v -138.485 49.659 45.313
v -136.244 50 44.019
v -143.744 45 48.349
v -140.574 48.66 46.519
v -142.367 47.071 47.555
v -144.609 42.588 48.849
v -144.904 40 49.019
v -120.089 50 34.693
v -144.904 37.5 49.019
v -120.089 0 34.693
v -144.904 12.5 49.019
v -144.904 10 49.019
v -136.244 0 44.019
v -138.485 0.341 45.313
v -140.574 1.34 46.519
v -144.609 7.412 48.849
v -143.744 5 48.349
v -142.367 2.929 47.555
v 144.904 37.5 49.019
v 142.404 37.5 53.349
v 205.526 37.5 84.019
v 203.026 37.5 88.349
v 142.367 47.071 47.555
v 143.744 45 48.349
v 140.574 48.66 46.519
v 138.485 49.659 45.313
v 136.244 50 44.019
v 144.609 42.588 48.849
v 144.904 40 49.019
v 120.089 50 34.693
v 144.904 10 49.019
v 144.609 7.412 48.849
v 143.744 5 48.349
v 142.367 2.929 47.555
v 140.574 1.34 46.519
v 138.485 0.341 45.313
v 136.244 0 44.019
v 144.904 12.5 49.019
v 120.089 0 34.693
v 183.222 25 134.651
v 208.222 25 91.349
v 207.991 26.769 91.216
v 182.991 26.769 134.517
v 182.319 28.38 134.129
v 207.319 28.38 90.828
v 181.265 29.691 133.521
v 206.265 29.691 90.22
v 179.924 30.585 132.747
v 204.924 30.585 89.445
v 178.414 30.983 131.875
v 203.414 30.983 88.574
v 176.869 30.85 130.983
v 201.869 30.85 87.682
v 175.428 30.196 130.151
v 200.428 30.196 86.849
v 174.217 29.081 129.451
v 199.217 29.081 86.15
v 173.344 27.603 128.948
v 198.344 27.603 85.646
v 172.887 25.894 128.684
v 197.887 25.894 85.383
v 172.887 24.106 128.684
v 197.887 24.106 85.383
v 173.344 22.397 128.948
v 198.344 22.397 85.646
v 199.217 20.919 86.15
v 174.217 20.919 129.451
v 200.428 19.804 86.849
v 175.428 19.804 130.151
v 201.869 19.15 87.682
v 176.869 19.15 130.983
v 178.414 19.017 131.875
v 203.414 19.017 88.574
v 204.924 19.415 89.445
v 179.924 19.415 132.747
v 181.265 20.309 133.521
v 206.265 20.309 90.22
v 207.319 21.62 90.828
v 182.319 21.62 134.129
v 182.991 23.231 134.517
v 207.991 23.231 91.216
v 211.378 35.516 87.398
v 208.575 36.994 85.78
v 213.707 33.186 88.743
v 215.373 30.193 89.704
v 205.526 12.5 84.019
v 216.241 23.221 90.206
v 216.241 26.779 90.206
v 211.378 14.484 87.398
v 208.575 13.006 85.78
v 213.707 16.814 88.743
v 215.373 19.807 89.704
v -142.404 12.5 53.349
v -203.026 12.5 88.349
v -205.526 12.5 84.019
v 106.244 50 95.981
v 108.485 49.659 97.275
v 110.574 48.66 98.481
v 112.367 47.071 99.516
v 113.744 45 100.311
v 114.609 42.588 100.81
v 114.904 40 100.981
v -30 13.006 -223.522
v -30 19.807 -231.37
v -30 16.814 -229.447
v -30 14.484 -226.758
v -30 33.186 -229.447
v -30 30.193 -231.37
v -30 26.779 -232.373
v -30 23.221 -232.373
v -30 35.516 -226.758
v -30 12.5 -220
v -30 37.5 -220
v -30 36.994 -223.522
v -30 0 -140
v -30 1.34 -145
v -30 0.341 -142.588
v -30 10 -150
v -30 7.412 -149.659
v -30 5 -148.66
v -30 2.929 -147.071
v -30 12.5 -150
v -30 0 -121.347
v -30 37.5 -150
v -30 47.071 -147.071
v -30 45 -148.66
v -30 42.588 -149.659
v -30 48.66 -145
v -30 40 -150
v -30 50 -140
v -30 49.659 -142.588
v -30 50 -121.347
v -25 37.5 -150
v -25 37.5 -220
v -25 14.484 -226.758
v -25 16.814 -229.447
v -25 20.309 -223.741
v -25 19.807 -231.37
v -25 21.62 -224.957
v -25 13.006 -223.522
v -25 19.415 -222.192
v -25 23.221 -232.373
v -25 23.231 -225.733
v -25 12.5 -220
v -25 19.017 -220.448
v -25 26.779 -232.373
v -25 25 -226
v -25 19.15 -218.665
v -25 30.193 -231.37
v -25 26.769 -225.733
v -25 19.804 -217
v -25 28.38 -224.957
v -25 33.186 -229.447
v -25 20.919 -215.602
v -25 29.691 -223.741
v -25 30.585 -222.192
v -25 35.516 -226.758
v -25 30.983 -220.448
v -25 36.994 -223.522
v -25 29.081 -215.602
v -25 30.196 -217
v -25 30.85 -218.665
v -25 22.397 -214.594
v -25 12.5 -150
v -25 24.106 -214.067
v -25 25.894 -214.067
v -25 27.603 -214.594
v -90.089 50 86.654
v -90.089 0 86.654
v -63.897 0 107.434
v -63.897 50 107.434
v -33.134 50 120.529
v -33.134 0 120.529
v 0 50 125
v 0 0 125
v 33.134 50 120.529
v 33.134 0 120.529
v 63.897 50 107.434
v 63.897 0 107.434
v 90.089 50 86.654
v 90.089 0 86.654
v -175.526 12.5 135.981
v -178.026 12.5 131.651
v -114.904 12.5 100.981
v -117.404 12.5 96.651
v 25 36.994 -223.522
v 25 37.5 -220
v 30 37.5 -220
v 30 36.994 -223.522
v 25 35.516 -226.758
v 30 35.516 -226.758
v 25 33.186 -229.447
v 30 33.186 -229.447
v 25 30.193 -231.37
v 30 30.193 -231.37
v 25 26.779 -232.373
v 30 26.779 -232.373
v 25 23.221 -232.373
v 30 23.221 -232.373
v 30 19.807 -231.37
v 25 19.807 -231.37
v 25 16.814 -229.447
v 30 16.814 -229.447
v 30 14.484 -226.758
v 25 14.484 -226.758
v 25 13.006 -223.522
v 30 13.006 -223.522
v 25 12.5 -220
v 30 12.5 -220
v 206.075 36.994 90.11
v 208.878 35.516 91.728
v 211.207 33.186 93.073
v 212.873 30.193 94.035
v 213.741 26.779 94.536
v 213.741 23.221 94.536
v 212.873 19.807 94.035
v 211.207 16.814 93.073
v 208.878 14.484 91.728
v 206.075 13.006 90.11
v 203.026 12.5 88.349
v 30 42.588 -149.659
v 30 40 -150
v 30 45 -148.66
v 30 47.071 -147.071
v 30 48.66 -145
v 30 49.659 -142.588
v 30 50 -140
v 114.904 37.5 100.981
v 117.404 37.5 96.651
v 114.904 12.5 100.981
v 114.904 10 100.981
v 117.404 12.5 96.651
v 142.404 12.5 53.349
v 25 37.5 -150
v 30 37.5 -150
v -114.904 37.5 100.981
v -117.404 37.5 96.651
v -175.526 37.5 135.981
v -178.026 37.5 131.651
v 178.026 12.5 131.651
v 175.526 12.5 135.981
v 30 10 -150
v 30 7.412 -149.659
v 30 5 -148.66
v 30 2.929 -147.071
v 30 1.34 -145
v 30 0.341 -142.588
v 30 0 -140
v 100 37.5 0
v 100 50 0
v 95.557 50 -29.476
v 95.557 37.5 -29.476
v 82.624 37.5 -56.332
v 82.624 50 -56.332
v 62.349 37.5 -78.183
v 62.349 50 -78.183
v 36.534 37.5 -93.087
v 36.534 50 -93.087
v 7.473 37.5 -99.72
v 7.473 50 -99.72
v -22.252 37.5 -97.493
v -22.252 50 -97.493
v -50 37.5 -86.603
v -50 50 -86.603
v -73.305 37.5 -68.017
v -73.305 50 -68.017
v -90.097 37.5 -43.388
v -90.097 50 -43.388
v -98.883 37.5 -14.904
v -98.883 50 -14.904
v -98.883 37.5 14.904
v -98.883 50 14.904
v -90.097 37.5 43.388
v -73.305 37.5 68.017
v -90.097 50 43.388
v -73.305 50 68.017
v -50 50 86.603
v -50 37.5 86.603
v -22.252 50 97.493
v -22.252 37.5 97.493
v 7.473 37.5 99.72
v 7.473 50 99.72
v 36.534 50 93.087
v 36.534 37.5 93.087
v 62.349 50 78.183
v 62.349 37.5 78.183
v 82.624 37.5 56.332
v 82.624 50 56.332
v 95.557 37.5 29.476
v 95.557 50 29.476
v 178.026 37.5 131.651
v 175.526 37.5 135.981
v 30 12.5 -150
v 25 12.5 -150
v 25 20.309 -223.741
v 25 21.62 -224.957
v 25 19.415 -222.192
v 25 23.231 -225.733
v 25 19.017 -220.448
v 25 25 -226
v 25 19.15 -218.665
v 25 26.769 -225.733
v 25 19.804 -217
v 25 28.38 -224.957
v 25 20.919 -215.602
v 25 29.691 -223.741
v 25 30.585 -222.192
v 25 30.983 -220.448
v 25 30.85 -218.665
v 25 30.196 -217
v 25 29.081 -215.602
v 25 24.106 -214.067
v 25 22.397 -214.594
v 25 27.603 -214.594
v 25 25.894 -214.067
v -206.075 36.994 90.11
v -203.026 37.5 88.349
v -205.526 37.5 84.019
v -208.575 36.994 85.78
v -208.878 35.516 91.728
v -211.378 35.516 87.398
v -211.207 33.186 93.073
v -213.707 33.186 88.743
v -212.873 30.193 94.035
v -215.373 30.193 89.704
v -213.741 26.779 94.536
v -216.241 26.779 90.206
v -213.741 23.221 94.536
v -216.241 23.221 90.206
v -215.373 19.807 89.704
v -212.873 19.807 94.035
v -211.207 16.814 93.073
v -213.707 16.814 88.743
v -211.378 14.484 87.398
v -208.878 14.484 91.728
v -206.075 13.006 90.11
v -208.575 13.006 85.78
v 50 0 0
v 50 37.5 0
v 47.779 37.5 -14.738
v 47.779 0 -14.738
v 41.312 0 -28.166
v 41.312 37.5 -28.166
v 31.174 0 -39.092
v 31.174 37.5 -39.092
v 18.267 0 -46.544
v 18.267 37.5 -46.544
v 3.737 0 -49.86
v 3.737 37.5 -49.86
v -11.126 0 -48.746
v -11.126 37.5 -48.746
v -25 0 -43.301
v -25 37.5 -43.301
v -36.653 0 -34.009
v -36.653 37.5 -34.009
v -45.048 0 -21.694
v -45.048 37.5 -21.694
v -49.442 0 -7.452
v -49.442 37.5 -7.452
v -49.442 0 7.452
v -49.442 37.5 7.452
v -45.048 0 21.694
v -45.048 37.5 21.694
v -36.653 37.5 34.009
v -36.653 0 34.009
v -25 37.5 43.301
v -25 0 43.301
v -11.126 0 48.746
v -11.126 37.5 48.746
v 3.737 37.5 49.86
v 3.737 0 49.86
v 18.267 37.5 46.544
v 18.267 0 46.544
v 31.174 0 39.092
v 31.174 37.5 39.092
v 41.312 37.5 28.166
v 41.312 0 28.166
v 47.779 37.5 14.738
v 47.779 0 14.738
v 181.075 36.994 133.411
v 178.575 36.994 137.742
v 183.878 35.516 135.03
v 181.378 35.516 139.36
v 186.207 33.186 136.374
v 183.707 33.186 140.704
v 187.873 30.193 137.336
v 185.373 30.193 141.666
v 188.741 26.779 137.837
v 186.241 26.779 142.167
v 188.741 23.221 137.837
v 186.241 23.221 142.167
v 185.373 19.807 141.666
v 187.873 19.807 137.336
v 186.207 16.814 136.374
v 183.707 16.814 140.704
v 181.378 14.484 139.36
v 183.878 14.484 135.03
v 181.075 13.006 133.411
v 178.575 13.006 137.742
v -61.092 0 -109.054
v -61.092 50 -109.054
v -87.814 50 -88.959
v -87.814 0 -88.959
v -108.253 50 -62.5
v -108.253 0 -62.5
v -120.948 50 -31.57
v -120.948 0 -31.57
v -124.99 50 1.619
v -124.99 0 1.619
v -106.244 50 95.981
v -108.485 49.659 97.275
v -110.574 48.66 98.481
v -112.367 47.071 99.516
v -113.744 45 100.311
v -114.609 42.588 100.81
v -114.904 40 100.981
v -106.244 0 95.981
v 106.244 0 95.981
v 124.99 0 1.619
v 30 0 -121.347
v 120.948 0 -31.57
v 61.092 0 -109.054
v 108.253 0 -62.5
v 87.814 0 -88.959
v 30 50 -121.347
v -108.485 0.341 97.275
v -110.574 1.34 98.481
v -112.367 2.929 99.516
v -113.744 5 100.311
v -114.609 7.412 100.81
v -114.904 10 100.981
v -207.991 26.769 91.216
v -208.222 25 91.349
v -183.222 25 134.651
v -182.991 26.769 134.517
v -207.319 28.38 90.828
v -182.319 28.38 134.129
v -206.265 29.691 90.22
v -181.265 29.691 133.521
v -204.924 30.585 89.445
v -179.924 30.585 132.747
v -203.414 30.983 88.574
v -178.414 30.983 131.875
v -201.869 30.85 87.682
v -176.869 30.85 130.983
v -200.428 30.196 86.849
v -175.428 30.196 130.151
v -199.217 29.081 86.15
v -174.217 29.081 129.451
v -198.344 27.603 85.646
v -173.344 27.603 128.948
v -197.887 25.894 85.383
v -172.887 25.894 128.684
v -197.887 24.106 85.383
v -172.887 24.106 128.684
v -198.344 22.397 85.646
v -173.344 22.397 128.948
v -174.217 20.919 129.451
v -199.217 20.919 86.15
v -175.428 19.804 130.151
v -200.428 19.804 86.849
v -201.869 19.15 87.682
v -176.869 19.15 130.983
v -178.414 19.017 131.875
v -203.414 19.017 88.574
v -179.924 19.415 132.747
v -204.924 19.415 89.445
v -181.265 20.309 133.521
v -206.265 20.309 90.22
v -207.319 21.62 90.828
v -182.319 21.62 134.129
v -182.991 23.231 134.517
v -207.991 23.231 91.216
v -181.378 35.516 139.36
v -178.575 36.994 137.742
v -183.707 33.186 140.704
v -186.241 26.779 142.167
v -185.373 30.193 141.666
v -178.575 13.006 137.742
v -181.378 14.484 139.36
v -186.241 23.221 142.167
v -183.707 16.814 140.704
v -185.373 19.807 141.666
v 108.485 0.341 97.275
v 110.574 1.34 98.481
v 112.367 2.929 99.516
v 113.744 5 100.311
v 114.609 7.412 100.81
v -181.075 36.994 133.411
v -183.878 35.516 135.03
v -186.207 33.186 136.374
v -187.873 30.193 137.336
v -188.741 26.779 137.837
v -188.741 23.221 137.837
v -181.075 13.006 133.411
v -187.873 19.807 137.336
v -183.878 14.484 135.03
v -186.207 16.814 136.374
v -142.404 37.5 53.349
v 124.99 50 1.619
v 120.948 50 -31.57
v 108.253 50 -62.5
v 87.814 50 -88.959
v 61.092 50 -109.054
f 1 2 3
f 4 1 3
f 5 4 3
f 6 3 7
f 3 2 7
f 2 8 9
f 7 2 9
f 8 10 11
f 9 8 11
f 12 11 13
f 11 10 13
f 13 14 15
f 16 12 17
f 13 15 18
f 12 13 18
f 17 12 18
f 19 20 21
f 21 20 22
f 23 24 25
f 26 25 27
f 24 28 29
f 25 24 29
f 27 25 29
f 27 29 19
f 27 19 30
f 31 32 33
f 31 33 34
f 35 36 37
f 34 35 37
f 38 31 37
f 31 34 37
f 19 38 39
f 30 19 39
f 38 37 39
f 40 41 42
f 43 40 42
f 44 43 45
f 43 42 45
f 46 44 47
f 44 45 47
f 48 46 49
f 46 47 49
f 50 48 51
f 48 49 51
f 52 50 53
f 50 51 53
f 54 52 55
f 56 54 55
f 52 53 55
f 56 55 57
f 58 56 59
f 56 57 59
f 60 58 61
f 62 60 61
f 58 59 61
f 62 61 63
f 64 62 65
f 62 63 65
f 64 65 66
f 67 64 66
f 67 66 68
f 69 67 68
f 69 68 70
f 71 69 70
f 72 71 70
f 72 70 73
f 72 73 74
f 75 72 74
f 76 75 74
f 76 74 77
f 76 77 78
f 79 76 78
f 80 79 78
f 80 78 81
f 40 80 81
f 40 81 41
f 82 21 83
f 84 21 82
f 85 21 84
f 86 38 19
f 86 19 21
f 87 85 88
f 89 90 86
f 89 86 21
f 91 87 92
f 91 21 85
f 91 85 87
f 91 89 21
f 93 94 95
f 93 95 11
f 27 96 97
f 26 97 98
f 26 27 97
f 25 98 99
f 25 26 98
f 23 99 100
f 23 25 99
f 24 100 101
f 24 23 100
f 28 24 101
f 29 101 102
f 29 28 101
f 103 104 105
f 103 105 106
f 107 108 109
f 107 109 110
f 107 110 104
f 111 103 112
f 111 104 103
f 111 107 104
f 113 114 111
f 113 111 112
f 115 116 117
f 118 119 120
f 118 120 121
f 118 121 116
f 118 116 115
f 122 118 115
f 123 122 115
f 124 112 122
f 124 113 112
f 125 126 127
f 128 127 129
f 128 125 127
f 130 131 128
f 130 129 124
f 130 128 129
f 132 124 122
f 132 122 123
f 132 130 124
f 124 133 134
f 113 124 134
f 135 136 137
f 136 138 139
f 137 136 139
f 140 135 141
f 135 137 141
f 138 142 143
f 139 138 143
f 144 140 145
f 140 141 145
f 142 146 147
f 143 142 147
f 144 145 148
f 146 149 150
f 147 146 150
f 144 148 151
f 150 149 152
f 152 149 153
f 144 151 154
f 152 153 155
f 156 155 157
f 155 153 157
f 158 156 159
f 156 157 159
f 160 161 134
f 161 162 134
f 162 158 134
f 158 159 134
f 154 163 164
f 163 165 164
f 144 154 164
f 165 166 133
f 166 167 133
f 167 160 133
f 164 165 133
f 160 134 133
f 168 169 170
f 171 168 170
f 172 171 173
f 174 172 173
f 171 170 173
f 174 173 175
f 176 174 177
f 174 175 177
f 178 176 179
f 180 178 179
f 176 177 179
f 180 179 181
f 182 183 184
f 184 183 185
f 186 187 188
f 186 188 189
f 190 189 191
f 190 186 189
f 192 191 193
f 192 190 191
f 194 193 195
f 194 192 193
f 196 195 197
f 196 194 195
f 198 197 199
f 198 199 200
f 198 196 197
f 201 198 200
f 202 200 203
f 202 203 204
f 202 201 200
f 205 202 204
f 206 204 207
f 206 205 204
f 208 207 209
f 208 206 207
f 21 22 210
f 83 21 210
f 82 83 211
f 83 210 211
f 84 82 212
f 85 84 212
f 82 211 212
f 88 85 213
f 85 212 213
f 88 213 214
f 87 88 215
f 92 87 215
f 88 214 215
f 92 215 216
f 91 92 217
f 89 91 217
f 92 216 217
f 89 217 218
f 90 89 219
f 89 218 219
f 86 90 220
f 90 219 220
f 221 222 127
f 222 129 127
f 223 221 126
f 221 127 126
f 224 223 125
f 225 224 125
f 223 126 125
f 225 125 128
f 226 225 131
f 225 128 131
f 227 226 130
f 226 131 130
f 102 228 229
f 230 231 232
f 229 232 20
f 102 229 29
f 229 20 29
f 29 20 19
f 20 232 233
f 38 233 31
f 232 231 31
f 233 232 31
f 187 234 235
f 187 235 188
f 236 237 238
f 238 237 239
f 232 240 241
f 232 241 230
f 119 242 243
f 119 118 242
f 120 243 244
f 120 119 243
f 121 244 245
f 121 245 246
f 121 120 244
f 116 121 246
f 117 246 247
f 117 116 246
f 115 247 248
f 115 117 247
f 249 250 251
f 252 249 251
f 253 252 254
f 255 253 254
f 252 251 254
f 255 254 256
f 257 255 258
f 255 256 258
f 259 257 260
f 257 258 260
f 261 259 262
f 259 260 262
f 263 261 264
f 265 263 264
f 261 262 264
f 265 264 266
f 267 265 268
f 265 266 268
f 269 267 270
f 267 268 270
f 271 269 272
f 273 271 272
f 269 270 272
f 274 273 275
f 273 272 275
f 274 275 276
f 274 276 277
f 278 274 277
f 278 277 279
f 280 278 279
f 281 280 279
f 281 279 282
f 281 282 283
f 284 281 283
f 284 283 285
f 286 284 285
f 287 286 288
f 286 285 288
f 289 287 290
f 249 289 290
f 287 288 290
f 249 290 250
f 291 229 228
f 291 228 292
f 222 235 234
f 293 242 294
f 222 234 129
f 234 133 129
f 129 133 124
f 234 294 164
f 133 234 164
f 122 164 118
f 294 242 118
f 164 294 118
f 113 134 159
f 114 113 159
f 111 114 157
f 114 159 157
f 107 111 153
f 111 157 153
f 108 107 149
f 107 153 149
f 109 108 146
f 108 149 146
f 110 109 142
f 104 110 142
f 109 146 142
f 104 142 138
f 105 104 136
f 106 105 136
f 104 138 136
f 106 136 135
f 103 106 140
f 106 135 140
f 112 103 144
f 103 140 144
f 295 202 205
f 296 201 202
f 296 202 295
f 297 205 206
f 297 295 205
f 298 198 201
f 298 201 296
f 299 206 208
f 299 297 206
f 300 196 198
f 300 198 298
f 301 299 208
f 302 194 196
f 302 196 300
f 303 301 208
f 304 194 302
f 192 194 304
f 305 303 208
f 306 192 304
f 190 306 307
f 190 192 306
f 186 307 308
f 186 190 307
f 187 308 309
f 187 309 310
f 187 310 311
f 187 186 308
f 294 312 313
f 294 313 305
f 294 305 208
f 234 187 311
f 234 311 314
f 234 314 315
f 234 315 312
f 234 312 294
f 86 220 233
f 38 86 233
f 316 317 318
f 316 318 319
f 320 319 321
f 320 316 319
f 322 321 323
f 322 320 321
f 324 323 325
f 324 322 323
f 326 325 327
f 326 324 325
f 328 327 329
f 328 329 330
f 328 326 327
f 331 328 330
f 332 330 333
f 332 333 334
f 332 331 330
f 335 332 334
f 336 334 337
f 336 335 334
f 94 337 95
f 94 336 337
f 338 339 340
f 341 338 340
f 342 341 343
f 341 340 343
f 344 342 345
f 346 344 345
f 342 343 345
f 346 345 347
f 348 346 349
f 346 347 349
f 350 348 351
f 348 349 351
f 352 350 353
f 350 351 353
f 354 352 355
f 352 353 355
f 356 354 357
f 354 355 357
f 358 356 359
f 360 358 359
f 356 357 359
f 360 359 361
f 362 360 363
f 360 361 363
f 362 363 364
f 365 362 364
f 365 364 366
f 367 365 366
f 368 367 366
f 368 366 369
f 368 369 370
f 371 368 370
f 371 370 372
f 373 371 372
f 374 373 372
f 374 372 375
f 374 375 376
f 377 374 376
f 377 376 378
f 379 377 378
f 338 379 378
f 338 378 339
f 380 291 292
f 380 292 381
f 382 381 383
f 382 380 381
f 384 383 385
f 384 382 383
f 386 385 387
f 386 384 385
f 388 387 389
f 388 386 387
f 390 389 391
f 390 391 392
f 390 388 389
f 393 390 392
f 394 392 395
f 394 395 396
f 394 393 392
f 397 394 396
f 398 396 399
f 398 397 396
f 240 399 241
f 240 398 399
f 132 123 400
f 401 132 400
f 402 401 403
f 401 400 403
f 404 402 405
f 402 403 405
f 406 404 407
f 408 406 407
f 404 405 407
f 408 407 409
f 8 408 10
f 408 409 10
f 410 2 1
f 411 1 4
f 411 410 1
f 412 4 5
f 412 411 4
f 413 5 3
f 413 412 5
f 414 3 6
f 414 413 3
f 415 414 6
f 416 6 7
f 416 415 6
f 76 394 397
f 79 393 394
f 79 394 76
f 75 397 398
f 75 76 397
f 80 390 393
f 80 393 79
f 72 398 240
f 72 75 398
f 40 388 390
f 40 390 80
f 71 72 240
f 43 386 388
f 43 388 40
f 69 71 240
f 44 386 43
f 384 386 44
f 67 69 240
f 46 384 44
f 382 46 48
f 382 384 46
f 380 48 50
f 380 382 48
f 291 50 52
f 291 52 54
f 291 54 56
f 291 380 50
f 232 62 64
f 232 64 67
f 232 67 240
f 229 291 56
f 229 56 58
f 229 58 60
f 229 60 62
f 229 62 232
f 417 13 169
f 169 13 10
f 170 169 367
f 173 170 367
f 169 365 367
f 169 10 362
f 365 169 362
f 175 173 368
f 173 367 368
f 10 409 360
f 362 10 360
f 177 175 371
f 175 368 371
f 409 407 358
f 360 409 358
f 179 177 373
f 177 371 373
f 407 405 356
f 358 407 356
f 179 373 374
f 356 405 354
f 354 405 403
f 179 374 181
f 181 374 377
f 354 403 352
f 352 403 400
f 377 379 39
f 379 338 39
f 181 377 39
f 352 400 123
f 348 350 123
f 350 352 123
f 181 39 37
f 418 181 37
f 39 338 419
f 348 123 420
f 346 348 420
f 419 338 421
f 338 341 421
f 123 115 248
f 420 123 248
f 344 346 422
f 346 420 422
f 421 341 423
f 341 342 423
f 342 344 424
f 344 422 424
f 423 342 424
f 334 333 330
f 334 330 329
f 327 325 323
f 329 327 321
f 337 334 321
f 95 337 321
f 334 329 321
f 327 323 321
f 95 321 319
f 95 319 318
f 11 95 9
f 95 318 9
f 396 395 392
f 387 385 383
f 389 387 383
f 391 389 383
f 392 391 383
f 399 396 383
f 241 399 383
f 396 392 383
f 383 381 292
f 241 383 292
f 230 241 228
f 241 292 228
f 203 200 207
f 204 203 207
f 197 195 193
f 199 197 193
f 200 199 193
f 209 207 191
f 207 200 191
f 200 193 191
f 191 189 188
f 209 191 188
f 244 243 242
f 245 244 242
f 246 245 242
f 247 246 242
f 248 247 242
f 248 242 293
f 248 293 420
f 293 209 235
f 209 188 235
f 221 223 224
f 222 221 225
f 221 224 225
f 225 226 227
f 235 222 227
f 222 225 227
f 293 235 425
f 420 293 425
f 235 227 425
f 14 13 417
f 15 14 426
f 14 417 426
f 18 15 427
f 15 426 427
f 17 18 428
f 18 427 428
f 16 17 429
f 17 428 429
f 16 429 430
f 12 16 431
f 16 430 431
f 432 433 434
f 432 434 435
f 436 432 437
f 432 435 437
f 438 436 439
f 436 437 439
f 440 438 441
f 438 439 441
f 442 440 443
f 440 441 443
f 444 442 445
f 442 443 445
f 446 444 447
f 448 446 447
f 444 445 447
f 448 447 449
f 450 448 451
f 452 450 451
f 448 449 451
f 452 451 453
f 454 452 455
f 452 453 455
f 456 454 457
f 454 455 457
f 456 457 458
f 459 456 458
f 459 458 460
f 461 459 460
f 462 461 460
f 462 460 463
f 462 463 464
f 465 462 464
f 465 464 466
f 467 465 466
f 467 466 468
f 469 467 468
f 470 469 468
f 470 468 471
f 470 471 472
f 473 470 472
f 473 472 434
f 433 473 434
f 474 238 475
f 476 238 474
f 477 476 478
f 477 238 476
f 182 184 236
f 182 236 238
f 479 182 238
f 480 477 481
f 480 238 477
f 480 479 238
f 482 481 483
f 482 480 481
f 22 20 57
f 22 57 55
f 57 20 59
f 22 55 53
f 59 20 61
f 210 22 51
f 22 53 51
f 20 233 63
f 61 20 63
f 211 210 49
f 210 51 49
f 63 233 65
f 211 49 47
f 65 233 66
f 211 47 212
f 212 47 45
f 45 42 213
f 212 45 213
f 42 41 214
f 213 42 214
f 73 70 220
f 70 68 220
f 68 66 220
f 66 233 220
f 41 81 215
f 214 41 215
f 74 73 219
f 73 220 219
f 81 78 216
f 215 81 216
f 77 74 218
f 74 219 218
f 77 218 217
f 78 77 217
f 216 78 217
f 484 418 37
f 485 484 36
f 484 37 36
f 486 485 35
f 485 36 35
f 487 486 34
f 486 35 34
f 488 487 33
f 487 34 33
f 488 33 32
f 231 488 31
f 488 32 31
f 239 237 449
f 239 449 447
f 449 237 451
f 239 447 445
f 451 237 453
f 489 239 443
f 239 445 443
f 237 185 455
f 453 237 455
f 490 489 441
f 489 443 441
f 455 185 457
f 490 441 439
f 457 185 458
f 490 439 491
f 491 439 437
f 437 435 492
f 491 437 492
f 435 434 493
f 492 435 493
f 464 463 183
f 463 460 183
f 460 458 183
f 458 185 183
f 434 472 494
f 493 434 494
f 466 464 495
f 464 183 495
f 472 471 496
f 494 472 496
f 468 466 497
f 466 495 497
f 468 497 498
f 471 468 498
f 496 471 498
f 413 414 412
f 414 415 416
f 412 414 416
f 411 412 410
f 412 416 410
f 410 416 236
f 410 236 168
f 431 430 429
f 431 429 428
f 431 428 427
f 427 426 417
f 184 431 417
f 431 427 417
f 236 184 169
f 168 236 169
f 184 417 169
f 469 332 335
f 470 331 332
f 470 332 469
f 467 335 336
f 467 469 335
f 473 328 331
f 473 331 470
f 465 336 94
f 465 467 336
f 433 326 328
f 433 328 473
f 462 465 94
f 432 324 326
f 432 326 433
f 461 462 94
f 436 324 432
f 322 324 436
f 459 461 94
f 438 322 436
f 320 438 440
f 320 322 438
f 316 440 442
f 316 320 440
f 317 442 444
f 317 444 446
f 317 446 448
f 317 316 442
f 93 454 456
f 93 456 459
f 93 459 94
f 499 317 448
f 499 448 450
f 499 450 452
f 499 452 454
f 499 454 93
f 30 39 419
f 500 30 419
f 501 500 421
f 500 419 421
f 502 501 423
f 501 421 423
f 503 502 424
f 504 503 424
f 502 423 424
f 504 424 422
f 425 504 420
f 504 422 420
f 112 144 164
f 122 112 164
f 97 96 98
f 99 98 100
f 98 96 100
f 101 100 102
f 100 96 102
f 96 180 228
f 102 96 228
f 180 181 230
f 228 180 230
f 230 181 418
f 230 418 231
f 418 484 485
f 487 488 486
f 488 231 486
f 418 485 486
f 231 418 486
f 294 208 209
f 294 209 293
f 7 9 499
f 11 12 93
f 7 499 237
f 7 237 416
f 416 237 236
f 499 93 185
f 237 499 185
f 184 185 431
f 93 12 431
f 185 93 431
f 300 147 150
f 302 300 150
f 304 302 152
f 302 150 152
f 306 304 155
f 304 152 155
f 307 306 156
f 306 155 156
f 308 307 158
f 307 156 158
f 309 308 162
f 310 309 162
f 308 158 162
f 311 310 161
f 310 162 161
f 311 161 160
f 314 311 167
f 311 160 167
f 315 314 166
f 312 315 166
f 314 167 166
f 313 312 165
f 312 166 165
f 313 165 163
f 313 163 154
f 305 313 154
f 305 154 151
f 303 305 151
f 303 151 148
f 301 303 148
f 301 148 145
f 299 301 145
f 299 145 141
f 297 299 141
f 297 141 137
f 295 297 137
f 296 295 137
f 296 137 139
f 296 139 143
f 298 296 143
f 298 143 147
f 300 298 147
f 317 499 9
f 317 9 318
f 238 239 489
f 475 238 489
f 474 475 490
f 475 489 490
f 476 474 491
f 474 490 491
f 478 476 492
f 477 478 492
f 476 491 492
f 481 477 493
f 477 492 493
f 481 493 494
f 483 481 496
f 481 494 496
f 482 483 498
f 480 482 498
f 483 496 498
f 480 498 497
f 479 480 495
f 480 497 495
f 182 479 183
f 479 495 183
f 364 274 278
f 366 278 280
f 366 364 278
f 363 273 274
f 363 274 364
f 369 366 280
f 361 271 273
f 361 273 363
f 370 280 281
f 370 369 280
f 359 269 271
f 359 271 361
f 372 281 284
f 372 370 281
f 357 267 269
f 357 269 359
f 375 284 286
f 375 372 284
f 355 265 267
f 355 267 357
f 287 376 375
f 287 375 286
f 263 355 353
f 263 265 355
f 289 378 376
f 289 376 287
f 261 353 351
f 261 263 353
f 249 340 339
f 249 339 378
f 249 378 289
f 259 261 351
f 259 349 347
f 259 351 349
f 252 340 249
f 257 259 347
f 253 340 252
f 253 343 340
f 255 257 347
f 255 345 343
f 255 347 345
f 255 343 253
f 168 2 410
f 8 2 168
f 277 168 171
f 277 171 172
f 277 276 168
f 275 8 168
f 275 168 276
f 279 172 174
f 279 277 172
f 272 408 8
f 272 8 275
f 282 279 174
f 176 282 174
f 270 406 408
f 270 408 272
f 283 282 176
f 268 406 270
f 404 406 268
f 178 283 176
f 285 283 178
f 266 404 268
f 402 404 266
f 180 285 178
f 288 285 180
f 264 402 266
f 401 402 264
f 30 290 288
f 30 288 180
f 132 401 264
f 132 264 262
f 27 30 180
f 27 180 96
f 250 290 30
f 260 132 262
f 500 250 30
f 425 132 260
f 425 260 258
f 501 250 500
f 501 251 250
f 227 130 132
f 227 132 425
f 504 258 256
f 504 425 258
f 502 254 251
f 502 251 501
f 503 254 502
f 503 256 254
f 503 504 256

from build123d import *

# Parameters (mm, degrees)
BOSS_EXTRUDE1_DEPTH      = 50
SKETCH3_R                = 50
CUT_EXTRUDE1_DEPTH       = 50
BOSS_EXTRUDE2_START      = 25
BOSS_EXTRUDE2_DEPTH      = 5
FILLET1_R                = 10
SKETCH6_R                = 100
CUT_EXTRUDE2_DEPTH       = 12.5
BOSS_EXTRUDE3_START      = -26
SKETCH7_R                = 6
BOSS_EXTRUDE3_DEPTH      = 51
CIRPATTERN1_COUNT        = 3
CIRPATTERN1_START        = 25
CIRPATTERN1_COPY_1_DEPTH = 5
CIRPATTERN1_COPY_2_DEPTH = 5


with BuildPart() as part:
    # Sketch1 → Boss-Extrude1 (new body)
    with BuildSketch(Plane(origin=(0, 0, 0), x_dir=(1, 0, 0), z_dir=(0, 1, 0))):
        with BuildLine():
            Line((0, 150), (-30, 150))
            Line((-30, 150), (-30, 121.346610995))
            ThreePointArc((-30, 121.346610995), (-108.253175473, 62.5), (-120.089247785, -34.692543384))
            Line((-120.089247785, -34.692543384), (-144.903810568, -49.019237886))
            Line((-144.903810568, -49.019237886), (-129.903810568, -75))
            Line((-129.903810568, -75), (-114.903810568, -100.980762114))
            Line((-114.903810568, -100.980762114), (-90.089247785, -86.654067611))
            ThreePointArc((-90.089247785, -86.654067611), (0, -125), (90.089247785, -86.654067611))
            Line((90.089247785, -86.654067611), (114.903810568, -100.980762114))
            Line((114.903810568, -100.980762114), (129.903810568, -75))
            Line((129.903810568, -75), (144.903810568, -49.019237886))
            Line((144.903810568, -49.019237886), (120.089247785, -34.692543384))
            ThreePointArc((120.089247785, -34.692543384), (108.253175473, 62.5), (30, 121.346610995))
            Line((30, 121.346610995), (30, 150))
            Line((30, 150), (0, 150))
        make_face()
    extrude(amount=BOSS_EXTRUDE1_DEPTH)

    # Sketch3 → Cut-Extrude1 (cut)
    with BuildSketch(Plane(origin=(0, 50, 0), x_dir=(1, 0, 0), z_dir=(0, 1, 0))):
        Circle(SKETCH3_R)
    extrude(amount=-CUT_EXTRUDE1_DEPTH, mode=Mode.SUBTRACT)

    # Sketch4 → Boss-Extrude2 (add)
    with BuildSketch(Plane(origin=(0, 0, 0), x_dir=(0, 0, -1), z_dir=(1, 0, 0)).offset(BOSS_EXTRUDE2_START)):
        with BuildLine():
            Line((150, 37.5), (220, 37.5))
            ThreePointArc((220, 37.5), (232.5, 25), (220, 12.5))
            Line((220, 12.5), (150, 12.5))
            ThreePointArc((150, 12.5), (137.5, 25), (150, 37.5))
        make_face()
    boss_extrude2 = extrude(amount=BOSS_EXTRUDE2_DEPTH)

    # Mirror1: Boss-Extrude2 across plane
    add(boss_extrude2.mirror(Plane(origin=(0, 0, 0), x_dir=(0, 0, 1), z_dir=(1, 0, 0))))

    # Fillet1
    fillet1_edges = [part.edges().sort_by_distance(p)[0] for p in [
        (-129.903810568, 50, 75),
        (0, 0, -150),
        (129.903810568, 0, 75),
        (-129.903810568, 0, 75),
        (129.903810568, 50, 75),
        (0, 50, -150),
    ]]
    fillet(fillet1_edges, radius=FILLET1_R)

    # Sketch6 → Cut-Extrude2 (cut)
    with BuildSketch(Plane(origin=(0, 50, 0), x_dir=(1, 0, 0), z_dir=(0, 1, 0))):
        Circle(SKETCH6_R)
    extrude(amount=-CUT_EXTRUDE2_DEPTH, mode=Mode.SUBTRACT)

    # Sketch7 → Boss-Extrude3 (add)
    with BuildSketch(Plane(origin=(0, 0, 0), x_dir=(0, 0, -1), z_dir=(1, 0, 0)).offset(BOSS_EXTRUDE3_START)):
        with Locations((220, 25)):
            Circle(SKETCH7_R)
    boss_extrude3 = extrude(amount=BOSS_EXTRUDE3_DEPTH)

    # CirPattern1: Boss-Extrude3, Boss-Extrude2 ×3 about axis
    cirpattern1_axis = Axis((0, 0, 0), (0, 1, 0))
    for i in range(1, CIRPATTERN1_COUNT):
        add(boss_extrude3.rotate(cirpattern1_axis, i * 360 / CIRPATTERN1_COUNT))
        add(boss_extrude2.rotate(cirpattern1_axis, i * 360 / CIRPATTERN1_COUNT))

    # CirPattern1 copy 1 sketch → CirPattern1 copy 1 (add)
    with BuildSketch(Plane(origin=(0, 0, 0), x_dir=(-0.866025404, 0, 0.5), z_dir=(0.5, 0, 0.866025404)).offset(CIRPATTERN1_START)):
        with BuildLine():
            Line((150, -37.5), (220, -37.5))
            ThreePointArc((220, -37.5), (232.5, -25), (220, -12.5))
            Line((220, -12.5), (150, -12.5))
            ThreePointArc((150, -12.5), (137.5, -25), (150, -37.5))
        make_face()
    extrude(amount=CIRPATTERN1_COPY_1_DEPTH)

    # CirPattern1 copy 2 sketch → CirPattern1 copy 2 (add)
    with BuildSketch(Plane(origin=(0, 0, 0), x_dir=(0.866025404, 0, 0.5), z_dir=(0.5, 0, -0.866025404)).offset(CIRPATTERN1_START)):
        with BuildLine():
            Line((150, -37.5), (220, -37.5))
            ThreePointArc((220, -37.5), (232.5, -25), (220, -12.5))
            Line((220, -12.5), (150, -12.5))
            ThreePointArc((150, -12.5), (137.5, -25), (150, -37.5))
        make_face()
    extrude(amount=CIRPATTERN1_COPY_2_DEPTH)


solid = part.part
